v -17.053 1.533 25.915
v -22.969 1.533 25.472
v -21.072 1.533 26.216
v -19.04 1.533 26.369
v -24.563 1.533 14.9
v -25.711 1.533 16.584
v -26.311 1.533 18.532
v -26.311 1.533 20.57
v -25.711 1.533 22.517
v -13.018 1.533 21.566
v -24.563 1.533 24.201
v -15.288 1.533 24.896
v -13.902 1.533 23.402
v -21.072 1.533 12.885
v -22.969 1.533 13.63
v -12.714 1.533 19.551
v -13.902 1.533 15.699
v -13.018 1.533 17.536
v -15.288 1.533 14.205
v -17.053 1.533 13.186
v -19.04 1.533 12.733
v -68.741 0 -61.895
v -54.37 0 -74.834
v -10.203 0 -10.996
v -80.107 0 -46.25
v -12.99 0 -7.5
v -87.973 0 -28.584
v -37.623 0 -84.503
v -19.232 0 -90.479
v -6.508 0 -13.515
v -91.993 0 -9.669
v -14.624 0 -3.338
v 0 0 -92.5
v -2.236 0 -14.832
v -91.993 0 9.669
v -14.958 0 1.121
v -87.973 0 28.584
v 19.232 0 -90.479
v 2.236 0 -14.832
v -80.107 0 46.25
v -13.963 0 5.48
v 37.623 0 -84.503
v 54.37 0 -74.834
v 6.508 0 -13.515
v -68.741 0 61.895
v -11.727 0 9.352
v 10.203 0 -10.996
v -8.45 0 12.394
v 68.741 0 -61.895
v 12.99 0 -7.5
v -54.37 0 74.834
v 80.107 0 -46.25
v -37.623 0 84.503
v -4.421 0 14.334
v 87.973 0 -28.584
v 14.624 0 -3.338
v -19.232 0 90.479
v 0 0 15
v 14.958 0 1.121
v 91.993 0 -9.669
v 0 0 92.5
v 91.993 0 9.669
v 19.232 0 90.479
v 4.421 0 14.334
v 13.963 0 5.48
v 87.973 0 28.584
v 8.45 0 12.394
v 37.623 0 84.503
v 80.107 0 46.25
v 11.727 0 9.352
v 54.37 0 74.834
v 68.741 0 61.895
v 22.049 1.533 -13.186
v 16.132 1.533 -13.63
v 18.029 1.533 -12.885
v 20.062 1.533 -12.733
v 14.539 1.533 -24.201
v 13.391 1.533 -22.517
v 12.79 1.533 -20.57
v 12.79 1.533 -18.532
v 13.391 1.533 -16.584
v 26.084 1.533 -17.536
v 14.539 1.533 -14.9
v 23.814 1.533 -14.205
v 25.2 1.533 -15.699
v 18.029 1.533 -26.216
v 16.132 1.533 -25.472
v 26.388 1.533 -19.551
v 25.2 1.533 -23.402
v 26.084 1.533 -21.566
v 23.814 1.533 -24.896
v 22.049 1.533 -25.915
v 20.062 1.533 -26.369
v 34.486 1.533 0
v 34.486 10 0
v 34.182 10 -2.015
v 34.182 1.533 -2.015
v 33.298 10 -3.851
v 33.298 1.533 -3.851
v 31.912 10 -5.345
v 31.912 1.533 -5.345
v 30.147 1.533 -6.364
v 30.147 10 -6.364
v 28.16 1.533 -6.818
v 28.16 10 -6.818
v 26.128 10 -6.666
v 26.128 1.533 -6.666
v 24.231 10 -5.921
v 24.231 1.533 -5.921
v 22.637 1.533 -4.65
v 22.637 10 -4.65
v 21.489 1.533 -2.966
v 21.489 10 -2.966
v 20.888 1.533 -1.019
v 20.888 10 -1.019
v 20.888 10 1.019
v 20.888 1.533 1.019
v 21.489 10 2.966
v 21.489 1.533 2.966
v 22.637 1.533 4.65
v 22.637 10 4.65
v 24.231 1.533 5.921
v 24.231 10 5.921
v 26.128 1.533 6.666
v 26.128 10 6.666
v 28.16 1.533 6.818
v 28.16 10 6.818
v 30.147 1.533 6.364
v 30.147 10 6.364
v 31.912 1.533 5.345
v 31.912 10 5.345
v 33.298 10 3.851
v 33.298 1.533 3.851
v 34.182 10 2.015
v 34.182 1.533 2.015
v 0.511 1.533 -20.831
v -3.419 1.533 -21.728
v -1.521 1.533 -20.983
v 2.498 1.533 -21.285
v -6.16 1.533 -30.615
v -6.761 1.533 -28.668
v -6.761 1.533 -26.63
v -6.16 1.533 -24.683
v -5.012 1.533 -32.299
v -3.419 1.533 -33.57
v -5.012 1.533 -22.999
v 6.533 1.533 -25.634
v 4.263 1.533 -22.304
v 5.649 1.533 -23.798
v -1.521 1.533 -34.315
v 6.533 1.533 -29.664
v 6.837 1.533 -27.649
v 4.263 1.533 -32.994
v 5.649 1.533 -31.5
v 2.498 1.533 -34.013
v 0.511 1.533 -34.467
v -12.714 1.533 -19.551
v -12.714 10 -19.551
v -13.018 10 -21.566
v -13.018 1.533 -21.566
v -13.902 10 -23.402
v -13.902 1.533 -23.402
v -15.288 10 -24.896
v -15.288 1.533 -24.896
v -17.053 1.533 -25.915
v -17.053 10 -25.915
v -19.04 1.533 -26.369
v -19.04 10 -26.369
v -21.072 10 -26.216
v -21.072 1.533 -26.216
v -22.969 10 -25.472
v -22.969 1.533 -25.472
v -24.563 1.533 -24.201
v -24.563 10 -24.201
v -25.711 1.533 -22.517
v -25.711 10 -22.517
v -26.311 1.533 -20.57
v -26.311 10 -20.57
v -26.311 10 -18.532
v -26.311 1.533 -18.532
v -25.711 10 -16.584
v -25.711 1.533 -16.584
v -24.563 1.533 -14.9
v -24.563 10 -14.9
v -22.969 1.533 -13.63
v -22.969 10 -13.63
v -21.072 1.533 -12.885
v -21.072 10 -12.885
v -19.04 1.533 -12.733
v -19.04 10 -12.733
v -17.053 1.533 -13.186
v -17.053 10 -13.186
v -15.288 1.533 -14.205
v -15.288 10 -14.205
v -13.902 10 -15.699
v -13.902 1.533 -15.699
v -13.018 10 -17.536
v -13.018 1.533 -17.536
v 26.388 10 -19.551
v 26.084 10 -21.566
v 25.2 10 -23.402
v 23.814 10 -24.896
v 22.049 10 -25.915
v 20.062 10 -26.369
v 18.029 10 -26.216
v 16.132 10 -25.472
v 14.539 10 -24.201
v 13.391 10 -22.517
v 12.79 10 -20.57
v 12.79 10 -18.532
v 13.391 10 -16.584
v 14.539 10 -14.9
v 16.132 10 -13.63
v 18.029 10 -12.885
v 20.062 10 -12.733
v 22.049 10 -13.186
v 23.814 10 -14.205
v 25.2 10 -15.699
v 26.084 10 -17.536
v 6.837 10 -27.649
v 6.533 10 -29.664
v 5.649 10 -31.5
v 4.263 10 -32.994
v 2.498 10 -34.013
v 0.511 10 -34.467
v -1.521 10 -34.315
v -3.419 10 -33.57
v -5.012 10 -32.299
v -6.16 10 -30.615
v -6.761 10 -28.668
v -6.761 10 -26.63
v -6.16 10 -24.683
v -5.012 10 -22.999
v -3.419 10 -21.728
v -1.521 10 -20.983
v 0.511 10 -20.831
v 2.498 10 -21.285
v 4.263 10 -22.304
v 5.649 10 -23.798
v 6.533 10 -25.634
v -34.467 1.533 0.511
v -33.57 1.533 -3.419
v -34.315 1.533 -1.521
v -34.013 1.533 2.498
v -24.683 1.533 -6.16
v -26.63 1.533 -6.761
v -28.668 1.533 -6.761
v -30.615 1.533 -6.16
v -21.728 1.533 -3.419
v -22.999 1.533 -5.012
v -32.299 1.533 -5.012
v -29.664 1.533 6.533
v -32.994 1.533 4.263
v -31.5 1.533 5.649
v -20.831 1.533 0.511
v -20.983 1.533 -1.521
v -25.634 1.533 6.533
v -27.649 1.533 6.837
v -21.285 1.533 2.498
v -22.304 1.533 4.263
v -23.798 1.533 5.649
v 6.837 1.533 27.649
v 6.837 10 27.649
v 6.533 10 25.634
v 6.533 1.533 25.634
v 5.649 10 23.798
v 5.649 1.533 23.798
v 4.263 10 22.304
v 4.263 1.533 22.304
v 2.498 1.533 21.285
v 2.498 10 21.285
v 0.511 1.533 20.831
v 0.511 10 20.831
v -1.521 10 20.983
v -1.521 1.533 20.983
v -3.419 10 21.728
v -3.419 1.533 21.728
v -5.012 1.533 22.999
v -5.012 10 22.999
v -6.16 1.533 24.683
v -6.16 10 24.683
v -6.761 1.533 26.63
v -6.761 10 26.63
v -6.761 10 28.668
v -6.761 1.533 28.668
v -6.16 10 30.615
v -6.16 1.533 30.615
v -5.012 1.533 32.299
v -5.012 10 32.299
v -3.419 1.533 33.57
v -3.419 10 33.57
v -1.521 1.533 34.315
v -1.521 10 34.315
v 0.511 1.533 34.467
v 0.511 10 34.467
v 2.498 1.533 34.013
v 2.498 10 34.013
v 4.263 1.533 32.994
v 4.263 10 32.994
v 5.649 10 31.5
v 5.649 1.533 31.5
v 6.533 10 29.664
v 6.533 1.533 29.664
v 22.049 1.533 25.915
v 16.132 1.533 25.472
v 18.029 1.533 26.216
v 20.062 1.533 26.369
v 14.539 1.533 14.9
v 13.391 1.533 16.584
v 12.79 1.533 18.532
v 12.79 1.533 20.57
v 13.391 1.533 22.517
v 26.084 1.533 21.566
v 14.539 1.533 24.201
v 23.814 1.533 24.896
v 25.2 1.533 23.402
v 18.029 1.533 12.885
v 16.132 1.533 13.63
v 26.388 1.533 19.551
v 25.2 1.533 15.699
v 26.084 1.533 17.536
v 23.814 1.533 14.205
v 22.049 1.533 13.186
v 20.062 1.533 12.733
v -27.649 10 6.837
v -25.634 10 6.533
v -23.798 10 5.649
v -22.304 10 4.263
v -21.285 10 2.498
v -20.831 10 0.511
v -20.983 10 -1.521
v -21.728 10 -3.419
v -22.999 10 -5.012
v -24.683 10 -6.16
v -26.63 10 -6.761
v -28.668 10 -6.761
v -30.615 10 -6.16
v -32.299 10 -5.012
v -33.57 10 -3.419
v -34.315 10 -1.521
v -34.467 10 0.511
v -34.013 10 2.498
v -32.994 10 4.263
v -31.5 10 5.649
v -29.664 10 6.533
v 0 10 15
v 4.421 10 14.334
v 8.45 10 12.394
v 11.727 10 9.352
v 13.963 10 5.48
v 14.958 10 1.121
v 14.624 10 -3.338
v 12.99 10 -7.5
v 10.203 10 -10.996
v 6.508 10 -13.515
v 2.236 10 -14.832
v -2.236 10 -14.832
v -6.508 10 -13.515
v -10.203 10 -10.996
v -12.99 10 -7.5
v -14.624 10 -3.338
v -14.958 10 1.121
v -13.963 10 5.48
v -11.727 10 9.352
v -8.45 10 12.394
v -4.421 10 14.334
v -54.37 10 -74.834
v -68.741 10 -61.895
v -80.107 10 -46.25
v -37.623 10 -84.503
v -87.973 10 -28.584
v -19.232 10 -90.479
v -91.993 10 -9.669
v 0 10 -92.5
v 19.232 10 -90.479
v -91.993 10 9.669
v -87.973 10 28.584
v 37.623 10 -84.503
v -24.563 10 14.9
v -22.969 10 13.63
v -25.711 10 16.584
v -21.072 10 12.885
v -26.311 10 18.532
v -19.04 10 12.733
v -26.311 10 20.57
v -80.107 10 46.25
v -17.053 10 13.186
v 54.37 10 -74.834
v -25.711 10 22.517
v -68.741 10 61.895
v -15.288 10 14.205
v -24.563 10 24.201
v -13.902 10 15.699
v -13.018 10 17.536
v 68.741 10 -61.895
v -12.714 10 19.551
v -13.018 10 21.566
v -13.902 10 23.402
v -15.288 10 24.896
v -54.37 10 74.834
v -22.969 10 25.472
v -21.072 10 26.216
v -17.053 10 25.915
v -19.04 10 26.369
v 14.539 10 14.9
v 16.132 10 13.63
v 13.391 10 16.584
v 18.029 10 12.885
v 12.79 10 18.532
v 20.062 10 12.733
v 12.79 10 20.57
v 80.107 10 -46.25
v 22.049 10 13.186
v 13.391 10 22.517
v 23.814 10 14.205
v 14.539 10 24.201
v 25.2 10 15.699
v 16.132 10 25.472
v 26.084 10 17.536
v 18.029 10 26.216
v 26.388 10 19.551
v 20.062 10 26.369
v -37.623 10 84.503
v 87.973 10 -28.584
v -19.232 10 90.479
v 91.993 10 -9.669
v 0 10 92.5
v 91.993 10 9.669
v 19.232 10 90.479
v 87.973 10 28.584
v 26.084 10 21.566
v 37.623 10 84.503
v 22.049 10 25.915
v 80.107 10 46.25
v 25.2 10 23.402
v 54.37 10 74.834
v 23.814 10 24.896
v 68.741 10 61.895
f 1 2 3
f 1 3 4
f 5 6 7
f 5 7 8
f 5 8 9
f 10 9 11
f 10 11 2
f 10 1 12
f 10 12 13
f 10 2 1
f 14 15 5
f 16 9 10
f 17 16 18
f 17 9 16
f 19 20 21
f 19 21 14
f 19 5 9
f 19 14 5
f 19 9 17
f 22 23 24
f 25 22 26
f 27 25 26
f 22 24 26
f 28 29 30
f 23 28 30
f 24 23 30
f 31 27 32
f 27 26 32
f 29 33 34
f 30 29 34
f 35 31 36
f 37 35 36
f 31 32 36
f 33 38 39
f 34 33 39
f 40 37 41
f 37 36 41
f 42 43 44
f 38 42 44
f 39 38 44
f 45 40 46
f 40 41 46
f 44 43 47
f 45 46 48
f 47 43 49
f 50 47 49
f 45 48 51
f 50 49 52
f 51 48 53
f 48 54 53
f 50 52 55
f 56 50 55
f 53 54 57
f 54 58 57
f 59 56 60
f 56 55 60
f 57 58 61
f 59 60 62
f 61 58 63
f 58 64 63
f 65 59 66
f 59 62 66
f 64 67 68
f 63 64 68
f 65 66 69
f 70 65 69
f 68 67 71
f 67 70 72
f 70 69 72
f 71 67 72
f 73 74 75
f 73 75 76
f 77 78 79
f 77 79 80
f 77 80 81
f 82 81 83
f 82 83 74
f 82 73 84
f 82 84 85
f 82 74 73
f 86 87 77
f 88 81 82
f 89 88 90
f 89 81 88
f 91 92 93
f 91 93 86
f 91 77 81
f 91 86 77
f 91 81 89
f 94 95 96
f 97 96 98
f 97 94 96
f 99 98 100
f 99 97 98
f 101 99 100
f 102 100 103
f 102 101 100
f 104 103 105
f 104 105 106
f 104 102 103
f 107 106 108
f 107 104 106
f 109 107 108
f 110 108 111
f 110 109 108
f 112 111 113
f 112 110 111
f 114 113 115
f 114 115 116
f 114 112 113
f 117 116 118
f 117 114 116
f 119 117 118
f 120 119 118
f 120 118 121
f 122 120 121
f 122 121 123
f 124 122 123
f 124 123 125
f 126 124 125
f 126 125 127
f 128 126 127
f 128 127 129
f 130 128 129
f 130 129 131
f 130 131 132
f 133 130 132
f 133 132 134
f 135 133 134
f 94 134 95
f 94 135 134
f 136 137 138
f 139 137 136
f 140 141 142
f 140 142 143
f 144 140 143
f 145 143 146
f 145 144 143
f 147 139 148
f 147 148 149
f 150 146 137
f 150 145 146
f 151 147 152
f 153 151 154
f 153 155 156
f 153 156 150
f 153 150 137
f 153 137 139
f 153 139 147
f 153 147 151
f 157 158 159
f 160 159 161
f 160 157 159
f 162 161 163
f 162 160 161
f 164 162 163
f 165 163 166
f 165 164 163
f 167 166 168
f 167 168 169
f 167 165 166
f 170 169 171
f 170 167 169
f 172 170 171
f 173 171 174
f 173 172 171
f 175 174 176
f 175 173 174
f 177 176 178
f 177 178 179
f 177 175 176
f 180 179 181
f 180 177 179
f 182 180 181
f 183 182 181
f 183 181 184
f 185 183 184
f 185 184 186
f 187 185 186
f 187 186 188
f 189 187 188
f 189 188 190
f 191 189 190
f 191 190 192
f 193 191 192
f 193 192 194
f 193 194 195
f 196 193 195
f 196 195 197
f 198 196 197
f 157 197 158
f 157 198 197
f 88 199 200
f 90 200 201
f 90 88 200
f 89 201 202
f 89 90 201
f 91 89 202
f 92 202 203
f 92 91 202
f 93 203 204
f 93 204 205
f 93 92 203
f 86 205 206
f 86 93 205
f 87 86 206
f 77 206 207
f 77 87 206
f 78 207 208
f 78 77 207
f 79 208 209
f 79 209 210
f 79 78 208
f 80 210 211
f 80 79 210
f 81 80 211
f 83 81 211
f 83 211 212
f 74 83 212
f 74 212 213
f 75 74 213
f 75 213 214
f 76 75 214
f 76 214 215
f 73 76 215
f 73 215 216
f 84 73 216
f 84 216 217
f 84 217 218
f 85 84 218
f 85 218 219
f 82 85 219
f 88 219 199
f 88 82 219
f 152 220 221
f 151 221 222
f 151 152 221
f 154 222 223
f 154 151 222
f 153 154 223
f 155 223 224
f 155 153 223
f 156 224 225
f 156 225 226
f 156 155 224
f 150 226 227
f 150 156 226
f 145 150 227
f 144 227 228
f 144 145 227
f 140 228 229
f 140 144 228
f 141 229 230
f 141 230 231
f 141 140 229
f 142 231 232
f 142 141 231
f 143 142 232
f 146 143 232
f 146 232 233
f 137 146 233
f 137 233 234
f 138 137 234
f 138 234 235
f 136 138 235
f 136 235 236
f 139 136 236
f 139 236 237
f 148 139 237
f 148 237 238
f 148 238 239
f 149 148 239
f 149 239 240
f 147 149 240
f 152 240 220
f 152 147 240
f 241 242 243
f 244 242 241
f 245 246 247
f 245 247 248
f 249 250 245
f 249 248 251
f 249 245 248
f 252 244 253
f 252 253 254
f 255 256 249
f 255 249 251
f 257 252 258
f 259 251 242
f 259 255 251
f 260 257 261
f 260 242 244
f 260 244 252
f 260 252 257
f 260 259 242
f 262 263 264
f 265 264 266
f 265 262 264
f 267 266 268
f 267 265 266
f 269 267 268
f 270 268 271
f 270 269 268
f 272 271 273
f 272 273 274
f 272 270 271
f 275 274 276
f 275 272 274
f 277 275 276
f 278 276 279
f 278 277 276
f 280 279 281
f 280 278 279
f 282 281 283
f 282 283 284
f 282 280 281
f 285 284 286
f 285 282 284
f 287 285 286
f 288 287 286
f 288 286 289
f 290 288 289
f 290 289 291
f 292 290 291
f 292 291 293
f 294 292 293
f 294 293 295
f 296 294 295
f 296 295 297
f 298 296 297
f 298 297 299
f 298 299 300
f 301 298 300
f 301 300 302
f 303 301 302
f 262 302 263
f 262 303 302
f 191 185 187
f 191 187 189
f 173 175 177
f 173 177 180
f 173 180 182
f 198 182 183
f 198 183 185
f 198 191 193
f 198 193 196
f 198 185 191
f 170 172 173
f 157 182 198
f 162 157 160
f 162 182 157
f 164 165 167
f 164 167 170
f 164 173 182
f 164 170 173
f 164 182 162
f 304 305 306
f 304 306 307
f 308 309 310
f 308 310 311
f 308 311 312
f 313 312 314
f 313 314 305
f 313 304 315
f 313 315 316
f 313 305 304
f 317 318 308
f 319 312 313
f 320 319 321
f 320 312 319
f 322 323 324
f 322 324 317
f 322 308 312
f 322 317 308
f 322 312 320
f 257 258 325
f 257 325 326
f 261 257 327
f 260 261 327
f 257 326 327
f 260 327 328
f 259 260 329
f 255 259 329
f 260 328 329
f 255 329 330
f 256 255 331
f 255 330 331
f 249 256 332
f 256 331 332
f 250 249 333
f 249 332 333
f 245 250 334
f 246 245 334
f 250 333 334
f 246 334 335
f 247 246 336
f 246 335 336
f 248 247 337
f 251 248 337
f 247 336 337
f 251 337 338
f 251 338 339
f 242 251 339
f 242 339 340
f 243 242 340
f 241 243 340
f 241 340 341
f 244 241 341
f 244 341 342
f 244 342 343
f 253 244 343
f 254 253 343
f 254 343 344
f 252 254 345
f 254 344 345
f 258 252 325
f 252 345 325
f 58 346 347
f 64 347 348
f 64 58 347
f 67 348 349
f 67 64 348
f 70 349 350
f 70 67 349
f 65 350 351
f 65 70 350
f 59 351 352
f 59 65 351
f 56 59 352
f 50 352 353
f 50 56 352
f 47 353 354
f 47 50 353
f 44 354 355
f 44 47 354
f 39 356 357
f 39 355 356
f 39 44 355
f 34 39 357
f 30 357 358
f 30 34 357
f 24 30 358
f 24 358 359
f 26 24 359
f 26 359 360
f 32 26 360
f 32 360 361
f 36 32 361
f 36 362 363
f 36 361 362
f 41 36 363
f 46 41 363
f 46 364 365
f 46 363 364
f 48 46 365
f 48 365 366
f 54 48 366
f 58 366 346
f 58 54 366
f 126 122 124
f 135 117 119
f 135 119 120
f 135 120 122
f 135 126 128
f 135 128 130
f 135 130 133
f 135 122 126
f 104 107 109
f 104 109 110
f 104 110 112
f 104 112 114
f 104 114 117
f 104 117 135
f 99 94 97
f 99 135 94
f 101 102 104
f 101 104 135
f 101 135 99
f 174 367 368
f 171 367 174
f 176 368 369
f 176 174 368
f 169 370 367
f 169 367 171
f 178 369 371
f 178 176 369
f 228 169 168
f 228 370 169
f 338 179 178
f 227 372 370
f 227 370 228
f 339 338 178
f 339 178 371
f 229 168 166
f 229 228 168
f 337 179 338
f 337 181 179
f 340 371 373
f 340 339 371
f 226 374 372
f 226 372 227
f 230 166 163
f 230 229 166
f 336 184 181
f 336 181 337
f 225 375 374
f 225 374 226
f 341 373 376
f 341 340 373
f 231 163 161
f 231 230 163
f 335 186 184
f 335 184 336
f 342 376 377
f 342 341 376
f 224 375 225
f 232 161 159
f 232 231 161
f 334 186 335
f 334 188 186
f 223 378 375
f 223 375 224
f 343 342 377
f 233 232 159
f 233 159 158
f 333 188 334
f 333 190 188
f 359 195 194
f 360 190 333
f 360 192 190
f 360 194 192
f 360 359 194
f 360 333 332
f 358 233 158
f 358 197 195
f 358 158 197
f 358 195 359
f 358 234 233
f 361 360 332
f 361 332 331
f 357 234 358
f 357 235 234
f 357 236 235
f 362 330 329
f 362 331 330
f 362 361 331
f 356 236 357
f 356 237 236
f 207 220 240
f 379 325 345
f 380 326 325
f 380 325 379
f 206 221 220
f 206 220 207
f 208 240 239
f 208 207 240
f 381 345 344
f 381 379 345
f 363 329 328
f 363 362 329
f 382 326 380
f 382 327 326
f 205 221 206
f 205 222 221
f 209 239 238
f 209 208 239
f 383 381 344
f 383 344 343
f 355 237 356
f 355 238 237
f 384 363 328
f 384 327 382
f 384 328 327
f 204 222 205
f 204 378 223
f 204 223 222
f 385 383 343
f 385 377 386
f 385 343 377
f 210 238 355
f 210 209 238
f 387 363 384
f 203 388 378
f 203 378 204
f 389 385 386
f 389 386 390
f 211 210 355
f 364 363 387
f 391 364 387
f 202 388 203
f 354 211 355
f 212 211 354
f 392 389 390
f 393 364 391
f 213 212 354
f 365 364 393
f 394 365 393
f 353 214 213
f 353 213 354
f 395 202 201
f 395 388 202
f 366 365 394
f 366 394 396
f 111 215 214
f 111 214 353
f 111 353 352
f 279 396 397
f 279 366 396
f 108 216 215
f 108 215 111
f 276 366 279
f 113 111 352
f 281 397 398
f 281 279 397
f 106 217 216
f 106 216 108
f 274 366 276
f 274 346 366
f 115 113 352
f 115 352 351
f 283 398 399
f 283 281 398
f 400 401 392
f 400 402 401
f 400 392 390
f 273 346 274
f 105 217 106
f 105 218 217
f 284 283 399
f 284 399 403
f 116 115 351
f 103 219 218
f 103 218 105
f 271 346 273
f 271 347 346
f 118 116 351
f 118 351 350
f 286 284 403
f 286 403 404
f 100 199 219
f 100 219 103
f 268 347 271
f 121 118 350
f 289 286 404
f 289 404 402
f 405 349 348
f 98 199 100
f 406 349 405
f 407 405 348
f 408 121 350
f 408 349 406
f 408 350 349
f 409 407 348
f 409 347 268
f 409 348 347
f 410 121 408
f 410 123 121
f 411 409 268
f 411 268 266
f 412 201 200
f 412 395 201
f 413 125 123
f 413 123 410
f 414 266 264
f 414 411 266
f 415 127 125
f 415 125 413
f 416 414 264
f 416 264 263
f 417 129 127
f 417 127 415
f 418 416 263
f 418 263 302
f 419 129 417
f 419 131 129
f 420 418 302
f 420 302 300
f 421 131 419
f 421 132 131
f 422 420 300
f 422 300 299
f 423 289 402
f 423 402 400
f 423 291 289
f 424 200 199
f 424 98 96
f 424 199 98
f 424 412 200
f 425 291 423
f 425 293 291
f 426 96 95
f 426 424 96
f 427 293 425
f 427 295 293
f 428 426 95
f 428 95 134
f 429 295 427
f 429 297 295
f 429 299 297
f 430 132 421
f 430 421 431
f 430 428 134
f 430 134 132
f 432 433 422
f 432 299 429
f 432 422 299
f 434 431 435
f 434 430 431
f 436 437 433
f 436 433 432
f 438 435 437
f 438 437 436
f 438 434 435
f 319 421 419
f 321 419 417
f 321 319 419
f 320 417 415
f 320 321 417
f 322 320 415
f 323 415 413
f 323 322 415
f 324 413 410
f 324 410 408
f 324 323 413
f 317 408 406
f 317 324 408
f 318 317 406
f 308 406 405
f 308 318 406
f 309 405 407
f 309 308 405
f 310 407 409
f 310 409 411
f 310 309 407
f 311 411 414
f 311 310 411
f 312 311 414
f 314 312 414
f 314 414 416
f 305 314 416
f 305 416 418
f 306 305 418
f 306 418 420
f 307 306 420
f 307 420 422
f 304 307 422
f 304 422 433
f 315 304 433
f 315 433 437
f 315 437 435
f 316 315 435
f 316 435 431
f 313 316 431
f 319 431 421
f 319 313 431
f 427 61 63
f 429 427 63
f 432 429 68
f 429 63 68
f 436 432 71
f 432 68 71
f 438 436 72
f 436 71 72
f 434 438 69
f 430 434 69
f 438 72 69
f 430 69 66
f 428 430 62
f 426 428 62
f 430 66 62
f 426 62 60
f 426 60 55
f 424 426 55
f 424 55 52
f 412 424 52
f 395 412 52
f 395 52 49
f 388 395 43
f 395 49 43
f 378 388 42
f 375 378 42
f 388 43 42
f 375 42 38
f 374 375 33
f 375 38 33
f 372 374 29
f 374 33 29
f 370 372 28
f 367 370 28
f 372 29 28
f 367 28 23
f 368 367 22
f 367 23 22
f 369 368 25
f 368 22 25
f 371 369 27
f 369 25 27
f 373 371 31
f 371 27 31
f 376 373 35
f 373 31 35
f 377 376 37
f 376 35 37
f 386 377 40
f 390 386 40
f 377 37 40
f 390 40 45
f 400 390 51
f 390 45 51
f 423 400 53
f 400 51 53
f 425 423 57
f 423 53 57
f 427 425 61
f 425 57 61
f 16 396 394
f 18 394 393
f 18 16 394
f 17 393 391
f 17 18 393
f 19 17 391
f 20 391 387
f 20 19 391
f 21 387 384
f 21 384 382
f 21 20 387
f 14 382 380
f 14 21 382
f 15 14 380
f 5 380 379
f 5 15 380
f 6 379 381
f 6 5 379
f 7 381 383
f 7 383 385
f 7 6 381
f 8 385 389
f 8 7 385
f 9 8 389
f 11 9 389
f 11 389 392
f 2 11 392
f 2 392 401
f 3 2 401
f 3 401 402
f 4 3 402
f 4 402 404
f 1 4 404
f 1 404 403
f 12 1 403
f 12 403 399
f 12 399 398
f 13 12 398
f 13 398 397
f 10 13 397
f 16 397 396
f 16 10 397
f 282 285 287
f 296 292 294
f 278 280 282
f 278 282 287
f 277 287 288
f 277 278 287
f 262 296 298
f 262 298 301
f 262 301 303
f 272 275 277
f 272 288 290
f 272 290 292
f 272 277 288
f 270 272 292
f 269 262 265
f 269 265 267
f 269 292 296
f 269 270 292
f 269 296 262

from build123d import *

# Parameters (mm, degrees)
SKETCH1_R           = 92.5
BOSS_EXTRUDE1_DEPTH = 10
SKETCH2_R           = 15
CUT_EXTRUDE1_DEPTH  = 132.196417634
SKETCH3_R           = 6.837022299
CUT_EXTRUDE2_DEPTH  = 8.46696136
CIRPATTERN1_COUNT   = 8


with BuildPart() as part:
    # Sketch1 → Boss-Extrude1 (new body)
    with BuildSketch(Plane(origin=(0, 0, 0), x_dir=(1, 0, 0), z_dir=(0, 1, 0))):
        Circle(SKETCH1_R)
    extrude(amount=BOSS_EXTRUDE1_DEPTH)

    # Sketch2 → Cut-Extrude1 (cut, through all)
    with BuildSketch(Plane(origin=(0, 0, 0), x_dir=(1, 0, 0), z_dir=(0, 1, 0))):
        Circle(SKETCH2_R)
    extrude(amount=CUT_EXTRUDE1_DEPTH, mode=Mode.SUBTRACT)

    # Sketch3 → Cut-Extrude2 (cut)
    with BuildSketch(Plane(origin=(0, 10, 0), x_dir=(1, 0, 0), z_dir=(0, 1, 0))):
        with Locations((-27.649021732, 0)):
            Circle(SKETCH3_R)
    cut_extrude2 = extrude(amount=-CUT_EXTRUDE2_DEPTH, mode=Mode.SUBTRACT)

    # CirPattern1: Cut-Extrude2 ×8 about axis
    cirpattern1_axis = Axis((0, 0, 0), (0, 1, 0))
    for i in range(1, CIRPATTERN1_COUNT):
        add(cut_extrude2.rotate(cirpattern1_axis, i * 360 / CIRPATTERN1_COUNT), mode=Mode.SUBTRACT)


solid = part.part
